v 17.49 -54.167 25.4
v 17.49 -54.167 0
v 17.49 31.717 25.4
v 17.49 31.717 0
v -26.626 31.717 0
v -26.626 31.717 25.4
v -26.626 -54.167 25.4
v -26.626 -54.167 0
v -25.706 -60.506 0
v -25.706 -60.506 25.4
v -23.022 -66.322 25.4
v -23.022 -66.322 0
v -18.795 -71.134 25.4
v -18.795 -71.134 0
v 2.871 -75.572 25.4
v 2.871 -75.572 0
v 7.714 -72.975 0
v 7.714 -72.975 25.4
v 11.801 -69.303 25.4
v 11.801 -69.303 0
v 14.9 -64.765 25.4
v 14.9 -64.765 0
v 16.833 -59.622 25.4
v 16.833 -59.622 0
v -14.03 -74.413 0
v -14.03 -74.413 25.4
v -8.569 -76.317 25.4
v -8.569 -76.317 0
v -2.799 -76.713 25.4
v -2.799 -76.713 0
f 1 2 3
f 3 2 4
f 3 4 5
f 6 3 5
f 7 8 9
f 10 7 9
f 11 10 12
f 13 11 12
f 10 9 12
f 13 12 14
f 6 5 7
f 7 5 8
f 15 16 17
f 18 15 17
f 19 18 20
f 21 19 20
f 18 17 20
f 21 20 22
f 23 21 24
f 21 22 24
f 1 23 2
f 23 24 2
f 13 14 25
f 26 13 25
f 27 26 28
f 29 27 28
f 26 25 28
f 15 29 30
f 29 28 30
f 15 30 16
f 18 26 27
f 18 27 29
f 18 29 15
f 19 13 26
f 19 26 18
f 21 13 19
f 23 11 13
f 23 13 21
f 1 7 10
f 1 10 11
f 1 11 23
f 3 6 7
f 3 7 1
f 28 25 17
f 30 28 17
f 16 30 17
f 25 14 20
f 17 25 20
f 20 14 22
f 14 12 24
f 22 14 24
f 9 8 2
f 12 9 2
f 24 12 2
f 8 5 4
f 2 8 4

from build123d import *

# Parameters (mm, degrees)
F1_DEPTH = 25.4


with BuildPart() as f1:
    # F0 (on Top) → F1 (new body)
    with BuildSketch(Plane.XY):
        with BuildLine():
            Line((17.489951, 31.716853), (-26.626494, 31.716853))
            Line((-26.626494, 31.716853), (-26.626494, -54.166641))
            ThreePointArc((-26.626494, -54.166641), (-24.574217, -63.510594), (-18.795172, -71.1345))
            ThreePointArc((-18.795172, -71.1345), (-8.568909, -76.317285), (2.871485, -75.572252))
            ThreePointArc((2.871485, -75.572252), (13.486649, -67.127156), (17.489951, -54.166641))
            Line((17.489951, -54.166641), (17.489951, 31.716853))
        make_face()
    extrude(amount=F1_DEPTH)


solid = f1.part
